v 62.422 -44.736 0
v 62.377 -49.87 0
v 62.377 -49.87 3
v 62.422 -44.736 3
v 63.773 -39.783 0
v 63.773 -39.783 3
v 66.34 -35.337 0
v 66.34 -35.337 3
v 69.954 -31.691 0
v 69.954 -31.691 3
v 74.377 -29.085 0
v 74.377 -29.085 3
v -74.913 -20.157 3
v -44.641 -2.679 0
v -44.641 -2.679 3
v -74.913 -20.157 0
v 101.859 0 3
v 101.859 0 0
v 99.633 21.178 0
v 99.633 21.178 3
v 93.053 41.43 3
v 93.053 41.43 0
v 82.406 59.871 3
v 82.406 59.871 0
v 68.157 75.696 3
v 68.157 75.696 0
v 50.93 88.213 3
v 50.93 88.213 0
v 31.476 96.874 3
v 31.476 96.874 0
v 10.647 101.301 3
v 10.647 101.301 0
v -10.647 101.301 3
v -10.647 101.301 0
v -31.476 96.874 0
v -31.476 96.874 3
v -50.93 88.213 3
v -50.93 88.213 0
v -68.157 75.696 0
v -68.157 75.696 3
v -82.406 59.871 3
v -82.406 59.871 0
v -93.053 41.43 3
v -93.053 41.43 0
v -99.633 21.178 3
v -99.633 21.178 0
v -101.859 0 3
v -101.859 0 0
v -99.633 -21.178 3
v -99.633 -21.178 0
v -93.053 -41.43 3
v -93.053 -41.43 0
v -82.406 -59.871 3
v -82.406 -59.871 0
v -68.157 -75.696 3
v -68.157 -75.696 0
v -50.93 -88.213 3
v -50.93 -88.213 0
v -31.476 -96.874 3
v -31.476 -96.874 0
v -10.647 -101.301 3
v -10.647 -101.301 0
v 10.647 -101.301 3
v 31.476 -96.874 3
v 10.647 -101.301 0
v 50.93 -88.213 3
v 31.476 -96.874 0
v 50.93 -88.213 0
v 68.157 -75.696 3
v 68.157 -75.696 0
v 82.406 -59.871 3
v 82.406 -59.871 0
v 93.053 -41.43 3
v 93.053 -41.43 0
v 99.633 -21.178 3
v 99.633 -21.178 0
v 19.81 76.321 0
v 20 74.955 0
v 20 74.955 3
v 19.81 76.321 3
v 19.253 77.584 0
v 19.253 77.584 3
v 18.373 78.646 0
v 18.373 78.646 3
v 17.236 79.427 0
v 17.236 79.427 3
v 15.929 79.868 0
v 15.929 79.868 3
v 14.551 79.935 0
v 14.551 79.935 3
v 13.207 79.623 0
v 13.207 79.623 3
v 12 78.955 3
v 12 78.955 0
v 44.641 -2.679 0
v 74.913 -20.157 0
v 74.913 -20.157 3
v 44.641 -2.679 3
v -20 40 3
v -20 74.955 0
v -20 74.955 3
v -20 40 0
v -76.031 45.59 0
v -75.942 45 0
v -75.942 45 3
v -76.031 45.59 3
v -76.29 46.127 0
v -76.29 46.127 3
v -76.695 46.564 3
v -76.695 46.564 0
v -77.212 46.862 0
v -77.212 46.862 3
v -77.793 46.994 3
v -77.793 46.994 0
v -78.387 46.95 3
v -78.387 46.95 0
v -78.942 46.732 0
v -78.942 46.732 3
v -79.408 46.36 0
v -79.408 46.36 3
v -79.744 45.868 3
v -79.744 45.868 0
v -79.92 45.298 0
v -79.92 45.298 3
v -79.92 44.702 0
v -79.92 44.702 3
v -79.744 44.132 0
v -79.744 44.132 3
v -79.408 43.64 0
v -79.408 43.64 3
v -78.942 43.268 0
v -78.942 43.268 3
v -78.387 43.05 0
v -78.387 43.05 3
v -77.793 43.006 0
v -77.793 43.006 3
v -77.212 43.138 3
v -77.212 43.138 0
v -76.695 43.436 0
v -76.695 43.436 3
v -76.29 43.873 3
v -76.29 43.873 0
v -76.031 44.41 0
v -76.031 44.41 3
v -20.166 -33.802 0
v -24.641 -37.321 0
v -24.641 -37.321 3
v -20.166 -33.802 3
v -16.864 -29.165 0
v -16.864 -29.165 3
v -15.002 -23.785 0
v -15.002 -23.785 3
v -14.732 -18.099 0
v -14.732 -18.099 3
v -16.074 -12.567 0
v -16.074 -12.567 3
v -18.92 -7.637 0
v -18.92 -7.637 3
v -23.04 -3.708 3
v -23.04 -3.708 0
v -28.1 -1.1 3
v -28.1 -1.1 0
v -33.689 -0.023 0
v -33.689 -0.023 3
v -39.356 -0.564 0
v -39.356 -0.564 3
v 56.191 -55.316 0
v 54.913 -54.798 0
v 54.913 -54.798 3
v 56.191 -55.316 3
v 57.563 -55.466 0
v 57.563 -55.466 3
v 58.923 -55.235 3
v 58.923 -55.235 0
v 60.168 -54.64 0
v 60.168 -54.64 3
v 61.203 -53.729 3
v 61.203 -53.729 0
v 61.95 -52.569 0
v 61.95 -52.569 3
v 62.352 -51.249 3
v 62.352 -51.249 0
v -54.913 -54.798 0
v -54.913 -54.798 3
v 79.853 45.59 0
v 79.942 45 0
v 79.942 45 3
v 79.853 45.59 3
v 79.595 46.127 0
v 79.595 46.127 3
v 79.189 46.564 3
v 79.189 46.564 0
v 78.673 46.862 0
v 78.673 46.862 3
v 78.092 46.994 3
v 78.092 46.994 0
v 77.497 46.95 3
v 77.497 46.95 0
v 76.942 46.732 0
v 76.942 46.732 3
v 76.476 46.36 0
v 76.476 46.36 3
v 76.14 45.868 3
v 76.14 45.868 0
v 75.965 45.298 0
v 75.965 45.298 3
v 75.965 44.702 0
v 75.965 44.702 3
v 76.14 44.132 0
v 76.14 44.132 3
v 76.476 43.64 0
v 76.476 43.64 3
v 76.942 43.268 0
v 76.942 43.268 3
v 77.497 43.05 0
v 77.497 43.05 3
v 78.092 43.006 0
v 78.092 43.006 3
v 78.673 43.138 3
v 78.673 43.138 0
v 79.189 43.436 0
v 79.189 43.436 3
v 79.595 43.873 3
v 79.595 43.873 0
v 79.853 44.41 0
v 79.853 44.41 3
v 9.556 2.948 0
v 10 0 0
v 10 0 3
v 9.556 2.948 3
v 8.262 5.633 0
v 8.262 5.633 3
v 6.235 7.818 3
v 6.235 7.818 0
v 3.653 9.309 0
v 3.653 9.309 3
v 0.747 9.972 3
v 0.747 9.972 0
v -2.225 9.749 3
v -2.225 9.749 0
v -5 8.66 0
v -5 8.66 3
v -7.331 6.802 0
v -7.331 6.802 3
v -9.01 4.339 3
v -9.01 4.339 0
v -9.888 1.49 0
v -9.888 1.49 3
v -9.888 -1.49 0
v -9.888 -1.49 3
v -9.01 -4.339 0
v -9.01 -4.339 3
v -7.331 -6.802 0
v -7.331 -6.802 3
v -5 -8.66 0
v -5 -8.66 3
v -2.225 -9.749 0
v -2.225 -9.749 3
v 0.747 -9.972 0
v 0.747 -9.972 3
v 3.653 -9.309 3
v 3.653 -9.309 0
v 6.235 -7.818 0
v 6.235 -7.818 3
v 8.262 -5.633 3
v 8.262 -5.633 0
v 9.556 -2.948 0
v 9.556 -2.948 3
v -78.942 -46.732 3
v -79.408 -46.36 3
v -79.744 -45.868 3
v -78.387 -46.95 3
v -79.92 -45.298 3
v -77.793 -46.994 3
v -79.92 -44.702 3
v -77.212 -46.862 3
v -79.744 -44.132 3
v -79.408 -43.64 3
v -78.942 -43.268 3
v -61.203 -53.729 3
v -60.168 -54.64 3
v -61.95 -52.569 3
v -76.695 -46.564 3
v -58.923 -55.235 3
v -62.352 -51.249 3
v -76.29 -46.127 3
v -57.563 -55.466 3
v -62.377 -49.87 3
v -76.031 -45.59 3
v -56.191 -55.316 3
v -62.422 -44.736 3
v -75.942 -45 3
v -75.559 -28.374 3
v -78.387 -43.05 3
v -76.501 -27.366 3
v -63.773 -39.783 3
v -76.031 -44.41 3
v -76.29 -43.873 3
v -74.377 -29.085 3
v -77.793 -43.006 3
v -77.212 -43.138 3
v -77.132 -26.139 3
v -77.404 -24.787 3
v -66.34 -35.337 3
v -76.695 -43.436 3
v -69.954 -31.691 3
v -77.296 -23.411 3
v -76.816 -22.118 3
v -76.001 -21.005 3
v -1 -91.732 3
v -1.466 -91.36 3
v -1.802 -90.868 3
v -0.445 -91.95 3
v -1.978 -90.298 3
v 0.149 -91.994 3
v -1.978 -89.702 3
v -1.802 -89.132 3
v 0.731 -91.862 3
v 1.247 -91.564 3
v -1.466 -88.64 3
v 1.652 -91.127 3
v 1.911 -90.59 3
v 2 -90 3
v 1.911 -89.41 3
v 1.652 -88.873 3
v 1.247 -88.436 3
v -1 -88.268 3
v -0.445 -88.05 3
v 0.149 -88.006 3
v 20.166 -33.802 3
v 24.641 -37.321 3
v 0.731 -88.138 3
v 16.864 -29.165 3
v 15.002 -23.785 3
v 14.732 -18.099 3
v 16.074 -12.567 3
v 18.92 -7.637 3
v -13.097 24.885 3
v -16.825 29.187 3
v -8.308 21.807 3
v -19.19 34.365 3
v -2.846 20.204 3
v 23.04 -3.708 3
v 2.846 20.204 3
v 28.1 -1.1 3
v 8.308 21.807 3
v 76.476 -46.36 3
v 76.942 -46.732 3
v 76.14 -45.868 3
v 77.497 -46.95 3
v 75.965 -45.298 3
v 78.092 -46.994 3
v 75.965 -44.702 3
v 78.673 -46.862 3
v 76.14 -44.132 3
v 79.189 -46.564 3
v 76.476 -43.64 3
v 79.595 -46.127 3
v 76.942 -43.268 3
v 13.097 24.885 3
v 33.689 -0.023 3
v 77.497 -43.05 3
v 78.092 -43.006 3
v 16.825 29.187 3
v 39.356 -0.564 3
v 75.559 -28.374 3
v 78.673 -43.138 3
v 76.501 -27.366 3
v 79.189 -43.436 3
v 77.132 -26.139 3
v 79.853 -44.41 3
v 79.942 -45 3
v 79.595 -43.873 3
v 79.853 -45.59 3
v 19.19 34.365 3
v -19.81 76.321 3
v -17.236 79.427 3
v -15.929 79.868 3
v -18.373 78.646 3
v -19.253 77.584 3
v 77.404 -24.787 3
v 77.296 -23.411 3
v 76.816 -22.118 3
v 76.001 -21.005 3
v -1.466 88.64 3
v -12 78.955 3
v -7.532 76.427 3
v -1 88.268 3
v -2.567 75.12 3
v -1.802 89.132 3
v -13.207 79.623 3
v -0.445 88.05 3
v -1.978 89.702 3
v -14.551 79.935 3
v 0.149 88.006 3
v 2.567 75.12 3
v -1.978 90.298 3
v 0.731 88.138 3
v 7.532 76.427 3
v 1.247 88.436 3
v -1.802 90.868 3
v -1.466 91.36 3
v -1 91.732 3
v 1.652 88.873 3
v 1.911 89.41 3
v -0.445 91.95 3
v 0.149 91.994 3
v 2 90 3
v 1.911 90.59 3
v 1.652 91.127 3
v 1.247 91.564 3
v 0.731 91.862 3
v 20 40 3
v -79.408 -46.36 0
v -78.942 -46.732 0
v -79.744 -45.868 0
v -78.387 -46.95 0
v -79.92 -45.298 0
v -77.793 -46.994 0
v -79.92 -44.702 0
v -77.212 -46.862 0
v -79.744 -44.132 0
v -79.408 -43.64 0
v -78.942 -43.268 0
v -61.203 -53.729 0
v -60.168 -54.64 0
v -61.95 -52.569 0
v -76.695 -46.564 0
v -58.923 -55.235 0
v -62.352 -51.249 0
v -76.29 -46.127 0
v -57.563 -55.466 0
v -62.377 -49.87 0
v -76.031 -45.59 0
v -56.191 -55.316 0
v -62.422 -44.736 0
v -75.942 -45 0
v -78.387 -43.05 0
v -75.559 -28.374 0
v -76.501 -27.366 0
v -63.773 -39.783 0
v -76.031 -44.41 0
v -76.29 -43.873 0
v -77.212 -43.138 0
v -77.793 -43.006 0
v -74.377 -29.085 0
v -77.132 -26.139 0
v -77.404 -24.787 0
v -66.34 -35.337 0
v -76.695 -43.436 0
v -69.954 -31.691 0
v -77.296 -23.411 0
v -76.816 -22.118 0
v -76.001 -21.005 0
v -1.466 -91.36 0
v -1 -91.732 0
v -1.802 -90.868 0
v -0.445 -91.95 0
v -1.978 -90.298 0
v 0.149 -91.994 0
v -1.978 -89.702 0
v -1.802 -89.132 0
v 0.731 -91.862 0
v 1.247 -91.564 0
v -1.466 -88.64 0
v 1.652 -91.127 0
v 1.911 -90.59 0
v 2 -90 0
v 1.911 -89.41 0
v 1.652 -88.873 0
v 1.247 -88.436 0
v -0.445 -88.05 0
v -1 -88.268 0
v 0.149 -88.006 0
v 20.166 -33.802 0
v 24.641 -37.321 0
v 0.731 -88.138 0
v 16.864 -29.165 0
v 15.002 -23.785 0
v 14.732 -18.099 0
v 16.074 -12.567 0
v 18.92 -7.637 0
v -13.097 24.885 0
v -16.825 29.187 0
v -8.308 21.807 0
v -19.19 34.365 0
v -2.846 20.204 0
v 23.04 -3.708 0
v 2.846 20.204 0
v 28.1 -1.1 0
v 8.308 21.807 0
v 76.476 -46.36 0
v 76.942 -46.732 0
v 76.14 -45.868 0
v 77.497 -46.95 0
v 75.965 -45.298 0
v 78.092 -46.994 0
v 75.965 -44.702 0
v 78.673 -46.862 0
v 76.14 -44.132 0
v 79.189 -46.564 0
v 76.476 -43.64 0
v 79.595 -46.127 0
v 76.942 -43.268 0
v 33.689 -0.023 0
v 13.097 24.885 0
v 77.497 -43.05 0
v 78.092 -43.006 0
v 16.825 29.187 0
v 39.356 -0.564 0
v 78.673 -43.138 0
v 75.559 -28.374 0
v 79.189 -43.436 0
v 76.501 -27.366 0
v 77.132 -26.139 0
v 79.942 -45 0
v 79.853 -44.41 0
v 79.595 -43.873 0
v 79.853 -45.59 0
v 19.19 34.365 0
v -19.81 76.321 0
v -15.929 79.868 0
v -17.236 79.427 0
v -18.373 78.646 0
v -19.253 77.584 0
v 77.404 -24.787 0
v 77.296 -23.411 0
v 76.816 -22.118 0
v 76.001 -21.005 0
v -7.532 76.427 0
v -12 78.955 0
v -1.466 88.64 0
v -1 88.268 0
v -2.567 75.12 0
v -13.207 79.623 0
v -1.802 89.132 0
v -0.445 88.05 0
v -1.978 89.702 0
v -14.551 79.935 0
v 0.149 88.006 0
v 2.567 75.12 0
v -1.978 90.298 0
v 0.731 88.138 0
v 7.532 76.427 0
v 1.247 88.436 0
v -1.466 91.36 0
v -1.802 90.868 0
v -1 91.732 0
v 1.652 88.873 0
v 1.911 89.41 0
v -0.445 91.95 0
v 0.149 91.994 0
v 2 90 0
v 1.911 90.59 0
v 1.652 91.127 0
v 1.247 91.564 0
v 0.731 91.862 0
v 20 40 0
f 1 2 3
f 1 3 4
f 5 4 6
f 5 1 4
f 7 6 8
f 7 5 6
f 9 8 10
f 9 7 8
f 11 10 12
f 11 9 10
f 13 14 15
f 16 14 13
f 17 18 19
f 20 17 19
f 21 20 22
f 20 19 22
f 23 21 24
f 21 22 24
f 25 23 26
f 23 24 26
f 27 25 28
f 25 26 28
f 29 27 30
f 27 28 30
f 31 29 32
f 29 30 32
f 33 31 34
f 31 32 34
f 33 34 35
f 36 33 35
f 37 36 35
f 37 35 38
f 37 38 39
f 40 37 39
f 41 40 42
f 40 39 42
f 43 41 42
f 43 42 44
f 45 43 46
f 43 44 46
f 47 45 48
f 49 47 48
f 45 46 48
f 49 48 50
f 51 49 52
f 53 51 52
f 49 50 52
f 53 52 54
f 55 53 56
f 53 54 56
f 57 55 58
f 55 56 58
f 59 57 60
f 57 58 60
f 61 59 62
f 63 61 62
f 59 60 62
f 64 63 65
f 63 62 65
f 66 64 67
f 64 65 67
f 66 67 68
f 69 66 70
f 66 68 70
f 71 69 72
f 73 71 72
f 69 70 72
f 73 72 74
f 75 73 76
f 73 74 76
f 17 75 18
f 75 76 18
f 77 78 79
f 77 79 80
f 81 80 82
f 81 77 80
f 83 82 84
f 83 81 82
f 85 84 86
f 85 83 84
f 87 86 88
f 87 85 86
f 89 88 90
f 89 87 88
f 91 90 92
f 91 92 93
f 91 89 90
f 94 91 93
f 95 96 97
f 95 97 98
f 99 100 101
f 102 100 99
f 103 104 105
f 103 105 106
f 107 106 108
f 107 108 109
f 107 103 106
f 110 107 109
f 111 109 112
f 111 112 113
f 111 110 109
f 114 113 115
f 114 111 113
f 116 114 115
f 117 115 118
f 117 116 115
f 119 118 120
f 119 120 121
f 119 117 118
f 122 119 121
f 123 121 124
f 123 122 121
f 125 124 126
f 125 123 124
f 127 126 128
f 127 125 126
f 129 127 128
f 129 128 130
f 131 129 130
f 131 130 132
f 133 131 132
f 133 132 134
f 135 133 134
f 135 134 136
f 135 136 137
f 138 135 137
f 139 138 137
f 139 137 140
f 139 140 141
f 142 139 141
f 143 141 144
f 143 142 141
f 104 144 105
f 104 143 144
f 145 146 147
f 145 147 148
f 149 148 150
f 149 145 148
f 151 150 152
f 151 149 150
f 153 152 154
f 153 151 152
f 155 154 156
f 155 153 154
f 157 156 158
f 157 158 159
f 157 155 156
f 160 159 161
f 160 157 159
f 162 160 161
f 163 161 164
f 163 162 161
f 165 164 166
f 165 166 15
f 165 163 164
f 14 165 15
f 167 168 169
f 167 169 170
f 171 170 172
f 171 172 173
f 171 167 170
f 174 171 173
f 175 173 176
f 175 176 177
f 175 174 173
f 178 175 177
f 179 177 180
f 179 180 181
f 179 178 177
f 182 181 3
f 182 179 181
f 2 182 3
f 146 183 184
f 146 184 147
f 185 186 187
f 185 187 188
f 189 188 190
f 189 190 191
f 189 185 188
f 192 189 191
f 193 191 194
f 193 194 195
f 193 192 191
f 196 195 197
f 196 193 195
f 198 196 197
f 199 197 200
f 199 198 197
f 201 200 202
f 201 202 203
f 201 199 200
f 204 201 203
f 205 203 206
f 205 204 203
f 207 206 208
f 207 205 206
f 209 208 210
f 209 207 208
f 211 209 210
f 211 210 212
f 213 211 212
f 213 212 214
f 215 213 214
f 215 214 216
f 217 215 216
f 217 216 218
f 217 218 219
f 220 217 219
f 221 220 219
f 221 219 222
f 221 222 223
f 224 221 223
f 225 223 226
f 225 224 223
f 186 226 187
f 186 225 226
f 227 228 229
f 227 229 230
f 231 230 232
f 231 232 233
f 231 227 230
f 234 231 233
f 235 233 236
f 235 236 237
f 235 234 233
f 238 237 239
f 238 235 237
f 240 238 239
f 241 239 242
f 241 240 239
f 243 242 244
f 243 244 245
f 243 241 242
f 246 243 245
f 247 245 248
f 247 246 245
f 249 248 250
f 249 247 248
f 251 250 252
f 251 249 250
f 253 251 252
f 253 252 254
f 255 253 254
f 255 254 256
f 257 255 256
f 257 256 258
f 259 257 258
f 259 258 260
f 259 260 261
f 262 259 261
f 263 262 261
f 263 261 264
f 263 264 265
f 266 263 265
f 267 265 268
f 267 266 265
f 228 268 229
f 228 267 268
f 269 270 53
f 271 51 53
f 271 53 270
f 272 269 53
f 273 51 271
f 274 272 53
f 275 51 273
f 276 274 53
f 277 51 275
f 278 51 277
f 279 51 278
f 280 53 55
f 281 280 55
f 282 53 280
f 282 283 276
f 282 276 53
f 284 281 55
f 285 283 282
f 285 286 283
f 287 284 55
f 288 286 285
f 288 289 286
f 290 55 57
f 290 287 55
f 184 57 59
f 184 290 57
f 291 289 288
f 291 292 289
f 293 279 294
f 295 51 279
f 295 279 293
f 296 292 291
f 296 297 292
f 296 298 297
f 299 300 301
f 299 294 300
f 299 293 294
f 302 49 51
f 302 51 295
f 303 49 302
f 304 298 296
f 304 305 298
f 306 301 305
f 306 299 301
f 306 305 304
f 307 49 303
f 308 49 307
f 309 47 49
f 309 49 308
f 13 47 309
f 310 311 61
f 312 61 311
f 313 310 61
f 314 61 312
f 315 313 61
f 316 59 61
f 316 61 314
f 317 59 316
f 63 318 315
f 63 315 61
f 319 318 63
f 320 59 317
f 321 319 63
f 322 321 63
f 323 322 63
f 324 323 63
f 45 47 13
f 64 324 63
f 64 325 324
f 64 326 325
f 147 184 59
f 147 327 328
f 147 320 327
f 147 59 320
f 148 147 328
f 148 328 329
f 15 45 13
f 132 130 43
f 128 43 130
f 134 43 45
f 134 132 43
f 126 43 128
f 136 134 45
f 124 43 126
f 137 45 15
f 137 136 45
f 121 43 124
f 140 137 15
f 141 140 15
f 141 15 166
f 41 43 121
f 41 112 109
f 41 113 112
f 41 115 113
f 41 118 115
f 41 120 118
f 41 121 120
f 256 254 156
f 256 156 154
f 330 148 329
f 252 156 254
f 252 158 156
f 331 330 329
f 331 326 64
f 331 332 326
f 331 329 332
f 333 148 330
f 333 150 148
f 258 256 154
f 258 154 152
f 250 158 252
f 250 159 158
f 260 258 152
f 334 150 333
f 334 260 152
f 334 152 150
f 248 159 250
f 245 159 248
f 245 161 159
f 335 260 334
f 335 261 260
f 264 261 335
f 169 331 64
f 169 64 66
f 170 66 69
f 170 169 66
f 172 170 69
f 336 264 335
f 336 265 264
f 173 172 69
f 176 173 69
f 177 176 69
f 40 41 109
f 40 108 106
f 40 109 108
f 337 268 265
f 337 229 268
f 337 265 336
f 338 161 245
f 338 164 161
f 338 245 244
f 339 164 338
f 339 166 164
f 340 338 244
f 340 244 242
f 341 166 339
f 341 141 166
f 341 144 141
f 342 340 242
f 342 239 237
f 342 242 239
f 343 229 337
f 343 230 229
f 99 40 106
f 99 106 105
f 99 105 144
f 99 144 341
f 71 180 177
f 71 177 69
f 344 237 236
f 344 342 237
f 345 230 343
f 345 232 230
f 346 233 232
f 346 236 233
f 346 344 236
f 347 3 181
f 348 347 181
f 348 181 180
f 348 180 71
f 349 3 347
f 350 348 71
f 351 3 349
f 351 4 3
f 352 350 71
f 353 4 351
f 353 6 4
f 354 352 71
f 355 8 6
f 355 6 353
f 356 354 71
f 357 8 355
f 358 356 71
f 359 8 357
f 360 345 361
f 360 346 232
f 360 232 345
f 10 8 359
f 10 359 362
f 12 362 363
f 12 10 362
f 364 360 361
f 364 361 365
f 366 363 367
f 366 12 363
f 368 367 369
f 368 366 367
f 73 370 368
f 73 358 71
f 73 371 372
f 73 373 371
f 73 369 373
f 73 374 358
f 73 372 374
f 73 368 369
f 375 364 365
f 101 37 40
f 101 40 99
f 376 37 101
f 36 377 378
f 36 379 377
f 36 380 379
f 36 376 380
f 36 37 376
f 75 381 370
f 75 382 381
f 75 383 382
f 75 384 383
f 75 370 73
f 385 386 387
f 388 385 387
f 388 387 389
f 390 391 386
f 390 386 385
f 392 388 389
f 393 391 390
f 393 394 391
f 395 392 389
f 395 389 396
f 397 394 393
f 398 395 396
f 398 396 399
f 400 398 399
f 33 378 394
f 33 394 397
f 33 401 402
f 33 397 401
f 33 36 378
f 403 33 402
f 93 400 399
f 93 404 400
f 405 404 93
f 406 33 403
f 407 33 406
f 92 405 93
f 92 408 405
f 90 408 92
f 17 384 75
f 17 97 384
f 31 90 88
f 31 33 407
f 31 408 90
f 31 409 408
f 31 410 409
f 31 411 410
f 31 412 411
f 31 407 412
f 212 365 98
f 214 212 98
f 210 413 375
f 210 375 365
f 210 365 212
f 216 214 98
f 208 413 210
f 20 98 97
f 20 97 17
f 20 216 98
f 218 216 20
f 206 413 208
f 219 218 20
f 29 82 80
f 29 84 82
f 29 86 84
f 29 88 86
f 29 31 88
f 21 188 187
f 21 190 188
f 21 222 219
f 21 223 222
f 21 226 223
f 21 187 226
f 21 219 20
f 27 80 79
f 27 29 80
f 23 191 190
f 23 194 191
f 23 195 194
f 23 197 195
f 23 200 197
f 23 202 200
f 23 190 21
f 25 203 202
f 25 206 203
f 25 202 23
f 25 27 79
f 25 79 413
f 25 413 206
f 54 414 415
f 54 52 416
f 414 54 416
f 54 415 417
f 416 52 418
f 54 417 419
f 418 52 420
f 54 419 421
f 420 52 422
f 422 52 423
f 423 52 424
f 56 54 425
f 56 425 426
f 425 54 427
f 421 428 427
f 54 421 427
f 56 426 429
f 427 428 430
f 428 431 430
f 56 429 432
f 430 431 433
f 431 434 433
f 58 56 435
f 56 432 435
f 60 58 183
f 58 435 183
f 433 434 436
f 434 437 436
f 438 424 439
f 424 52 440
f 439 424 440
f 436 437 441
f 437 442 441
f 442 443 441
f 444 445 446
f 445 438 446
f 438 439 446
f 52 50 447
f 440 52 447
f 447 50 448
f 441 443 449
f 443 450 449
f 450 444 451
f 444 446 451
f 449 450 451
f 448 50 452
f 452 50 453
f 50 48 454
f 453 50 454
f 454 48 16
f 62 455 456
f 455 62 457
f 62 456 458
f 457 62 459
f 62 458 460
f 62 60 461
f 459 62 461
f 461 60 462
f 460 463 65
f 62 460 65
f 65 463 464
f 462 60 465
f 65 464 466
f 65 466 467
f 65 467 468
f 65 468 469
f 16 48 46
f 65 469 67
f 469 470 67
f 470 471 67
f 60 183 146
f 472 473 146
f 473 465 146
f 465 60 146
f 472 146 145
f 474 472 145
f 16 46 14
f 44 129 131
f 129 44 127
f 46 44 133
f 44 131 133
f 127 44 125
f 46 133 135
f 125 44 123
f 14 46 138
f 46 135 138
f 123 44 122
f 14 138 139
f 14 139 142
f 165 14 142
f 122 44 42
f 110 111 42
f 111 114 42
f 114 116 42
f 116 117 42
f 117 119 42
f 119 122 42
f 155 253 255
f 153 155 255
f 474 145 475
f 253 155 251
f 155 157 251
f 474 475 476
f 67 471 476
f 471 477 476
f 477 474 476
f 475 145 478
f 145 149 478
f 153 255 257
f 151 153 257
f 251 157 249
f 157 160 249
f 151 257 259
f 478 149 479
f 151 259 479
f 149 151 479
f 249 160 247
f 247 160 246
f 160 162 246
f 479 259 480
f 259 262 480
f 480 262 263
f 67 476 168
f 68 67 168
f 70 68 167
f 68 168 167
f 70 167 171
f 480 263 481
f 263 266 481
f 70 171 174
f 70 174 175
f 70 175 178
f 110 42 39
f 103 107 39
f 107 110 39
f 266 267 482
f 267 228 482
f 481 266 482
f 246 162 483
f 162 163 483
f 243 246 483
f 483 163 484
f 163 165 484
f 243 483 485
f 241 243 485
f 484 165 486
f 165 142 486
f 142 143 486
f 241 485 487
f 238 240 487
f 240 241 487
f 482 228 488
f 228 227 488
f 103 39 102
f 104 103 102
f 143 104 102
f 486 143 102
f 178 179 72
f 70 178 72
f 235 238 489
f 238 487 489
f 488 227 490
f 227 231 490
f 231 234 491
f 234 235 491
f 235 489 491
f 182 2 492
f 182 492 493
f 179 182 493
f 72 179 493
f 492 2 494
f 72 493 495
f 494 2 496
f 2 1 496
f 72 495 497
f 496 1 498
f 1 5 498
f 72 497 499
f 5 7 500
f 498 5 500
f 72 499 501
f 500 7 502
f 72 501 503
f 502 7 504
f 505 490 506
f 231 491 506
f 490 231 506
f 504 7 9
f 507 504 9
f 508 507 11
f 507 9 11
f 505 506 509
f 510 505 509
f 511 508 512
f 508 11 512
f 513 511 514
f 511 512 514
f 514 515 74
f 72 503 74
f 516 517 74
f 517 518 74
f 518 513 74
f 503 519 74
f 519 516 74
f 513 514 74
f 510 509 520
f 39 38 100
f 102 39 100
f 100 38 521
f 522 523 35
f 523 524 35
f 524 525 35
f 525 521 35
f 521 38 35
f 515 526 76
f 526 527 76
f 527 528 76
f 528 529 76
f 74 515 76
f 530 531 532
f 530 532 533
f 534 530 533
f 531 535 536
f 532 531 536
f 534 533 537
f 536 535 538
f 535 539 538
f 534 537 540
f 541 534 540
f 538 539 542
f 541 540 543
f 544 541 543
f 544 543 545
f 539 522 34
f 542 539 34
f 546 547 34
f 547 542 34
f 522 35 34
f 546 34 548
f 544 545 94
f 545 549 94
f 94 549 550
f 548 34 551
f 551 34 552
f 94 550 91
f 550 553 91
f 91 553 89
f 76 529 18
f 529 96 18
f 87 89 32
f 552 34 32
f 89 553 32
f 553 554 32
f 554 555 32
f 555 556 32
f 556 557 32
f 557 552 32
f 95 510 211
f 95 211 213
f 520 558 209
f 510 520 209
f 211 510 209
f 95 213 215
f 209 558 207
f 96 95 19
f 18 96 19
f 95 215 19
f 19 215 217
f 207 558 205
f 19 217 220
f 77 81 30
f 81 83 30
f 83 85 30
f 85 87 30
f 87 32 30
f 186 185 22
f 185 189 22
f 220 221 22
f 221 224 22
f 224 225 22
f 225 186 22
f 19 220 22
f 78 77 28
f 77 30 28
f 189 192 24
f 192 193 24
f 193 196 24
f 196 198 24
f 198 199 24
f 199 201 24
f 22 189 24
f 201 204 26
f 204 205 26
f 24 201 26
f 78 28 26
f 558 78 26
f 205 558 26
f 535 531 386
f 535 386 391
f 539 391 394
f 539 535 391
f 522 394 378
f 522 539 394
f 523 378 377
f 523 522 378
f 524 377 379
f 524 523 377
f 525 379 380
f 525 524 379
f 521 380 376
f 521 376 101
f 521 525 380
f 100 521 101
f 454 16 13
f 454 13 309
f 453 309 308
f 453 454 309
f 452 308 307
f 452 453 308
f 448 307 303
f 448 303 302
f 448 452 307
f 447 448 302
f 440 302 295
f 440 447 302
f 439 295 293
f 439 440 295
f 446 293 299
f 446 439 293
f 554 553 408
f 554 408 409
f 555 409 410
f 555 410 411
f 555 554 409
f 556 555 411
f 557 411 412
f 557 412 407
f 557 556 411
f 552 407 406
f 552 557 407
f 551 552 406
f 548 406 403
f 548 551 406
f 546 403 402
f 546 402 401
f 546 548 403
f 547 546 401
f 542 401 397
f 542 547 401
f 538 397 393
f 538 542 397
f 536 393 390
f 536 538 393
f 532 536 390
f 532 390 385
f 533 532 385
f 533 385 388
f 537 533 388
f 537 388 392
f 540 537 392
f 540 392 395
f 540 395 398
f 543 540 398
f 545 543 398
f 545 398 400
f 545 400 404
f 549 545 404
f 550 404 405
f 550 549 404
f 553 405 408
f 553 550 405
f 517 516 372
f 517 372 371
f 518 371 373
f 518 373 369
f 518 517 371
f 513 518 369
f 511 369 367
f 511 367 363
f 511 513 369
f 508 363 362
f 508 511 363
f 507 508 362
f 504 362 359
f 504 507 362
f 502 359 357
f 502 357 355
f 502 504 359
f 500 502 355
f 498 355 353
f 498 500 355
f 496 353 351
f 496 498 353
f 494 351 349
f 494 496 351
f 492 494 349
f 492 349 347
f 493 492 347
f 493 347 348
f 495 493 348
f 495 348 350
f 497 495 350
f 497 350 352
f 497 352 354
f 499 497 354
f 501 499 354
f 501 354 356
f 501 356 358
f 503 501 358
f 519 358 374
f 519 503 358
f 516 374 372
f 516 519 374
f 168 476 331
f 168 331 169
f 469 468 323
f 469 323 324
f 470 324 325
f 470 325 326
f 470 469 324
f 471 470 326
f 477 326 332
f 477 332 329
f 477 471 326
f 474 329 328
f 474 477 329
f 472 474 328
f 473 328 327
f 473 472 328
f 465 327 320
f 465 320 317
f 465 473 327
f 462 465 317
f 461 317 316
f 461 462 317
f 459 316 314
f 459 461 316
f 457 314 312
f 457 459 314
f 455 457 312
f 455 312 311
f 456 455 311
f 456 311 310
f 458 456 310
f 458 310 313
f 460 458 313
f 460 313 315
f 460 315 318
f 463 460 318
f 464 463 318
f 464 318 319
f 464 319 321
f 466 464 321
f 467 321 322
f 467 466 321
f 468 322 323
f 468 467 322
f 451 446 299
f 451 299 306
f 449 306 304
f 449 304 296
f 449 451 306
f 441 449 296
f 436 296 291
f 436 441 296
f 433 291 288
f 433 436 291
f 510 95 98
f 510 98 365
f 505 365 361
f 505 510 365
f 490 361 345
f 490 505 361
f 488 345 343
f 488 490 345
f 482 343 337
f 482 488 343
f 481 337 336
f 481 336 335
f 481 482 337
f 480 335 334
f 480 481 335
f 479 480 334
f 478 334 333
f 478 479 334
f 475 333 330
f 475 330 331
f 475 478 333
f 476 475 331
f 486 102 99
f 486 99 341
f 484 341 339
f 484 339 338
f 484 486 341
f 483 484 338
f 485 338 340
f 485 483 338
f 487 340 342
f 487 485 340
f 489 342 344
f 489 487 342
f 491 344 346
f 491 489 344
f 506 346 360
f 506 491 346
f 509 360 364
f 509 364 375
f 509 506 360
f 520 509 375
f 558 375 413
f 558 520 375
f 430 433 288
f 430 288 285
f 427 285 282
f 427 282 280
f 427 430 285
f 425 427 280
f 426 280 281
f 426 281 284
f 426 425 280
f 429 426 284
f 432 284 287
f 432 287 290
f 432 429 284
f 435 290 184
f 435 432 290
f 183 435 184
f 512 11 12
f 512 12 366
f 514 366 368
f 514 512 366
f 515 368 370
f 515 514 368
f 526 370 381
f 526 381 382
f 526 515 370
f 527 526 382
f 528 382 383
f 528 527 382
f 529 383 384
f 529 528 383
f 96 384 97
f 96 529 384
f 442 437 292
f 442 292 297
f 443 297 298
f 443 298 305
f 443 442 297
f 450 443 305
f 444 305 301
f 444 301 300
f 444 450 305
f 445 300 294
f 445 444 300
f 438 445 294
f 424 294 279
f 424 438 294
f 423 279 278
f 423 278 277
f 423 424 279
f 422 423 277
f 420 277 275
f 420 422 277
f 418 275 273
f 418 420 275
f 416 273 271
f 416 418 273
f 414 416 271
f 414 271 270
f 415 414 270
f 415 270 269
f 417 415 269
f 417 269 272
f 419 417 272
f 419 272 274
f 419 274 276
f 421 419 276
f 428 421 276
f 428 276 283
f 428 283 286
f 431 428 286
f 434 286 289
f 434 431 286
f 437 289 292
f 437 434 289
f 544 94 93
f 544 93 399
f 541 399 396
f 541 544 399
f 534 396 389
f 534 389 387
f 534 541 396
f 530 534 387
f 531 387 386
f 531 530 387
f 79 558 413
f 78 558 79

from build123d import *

# Parameters (mm, degrees)
SKETCH1_R           = 101.859163579
SKETCH1_R_2         = 2
SKETCH1_R_3         = 10
BOSS_EXTRUDE1_DEPTH = 3


with BuildPart() as part:
    # Sketch1 → Boss-Extrude1 (new body)
    with BuildSketch(Plane.XY):
        Circle(SKETCH1_R)
        with Locations((0, 90)):
            Circle(SKETCH1_R_2, mode=Mode.SUBTRACT)
        with Locations((77.942286341, 45)):
            Circle(SKETCH1_R_2, mode=Mode.SUBTRACT)
        with Locations((77.942286341, -45)):
            Circle(SKETCH1_R_2, mode=Mode.SUBTRACT)
        with Locations((0, -90)):
            Circle(SKETCH1_R_2, mode=Mode.SUBTRACT)
        with Locations((-77.942286341, -45)):
            Circle(SKETCH1_R_2, mode=Mode.SUBTRACT)
        with Locations((-77.942286341, 45)):
            Circle(SKETCH1_R_2, mode=Mode.SUBTRACT)
        Circle(SKETCH1_R_3, mode=Mode.SUBTRACT)
        with BuildLine():
            Line((-20, 74.95508592), (-20, 40))
            ThreePointArc((-20, 40), (0, 20), (20, 40))
            Line((20, 40), (20, 74.95508592))
            ThreePointArc((20, 74.95508592), (17.236067977, 79.427221875), (12, 78.95508592))
            ThreePointArc((12, 78.95508592), (0, 74.95508592), (-12, 78.95508592))
            ThreePointArc((-12, 78.95508592), (-17.236067977, 79.427221875), (-20, 74.95508592))
        make_face(mode=Mode.SUBTRACT)
        with BuildLine():
            Line((74.91300855, -20.157034884), (44.641016151, -2.679491924))
            ThreePointArc((44.641016151, -2.679491924), (17.320508076, -10), (24.641016151, -37.320508076))
            Line((24.641016151, -37.320508076), (54.91300855, -54.798051036))
            ThreePointArc((54.91300855, -54.798051036), (60.167957907, -54.640483667), (62.377110165, -49.869847805))
            ThreePointArc((62.377110165, -49.869847805), (64.91300855, -37.47754296), (74.377110165, -29.085238115))
            ThreePointArc((74.377110165, -29.085238115), (77.404025885, -24.786738208), (74.91300855, -20.157034884))
        make_face(mode=Mode.SUBTRACT)
        with BuildLine():
            Line((-54.91300855, -54.798051036), (-24.641016151, -37.320508076))
            ThreePointArc((-24.641016151, -37.320508076), (-17.320508076, -10), (-44.641016151, -2.679491924))
            Line((-44.641016151, -2.679491924), (-74.91300855, -20.157034884))
            ThreePointArc((-74.91300855, -20.157034884), (-77.404025885, -24.786738208), (-74.377110165, -29.085238115))
            ThreePointArc((-74.377110165, -29.085238115), (-64.91300855, -37.47754296), (-62.377110165, -49.869847805))
            ThreePointArc((-62.377110165, -49.869847805), (-60.167957907, -54.640483667), (-54.91300855, -54.798051036))
        make_face(mode=Mode.SUBTRACT)
    extrude(amount=BOSS_EXTRUDE1_DEPTH)


solid = part.part
